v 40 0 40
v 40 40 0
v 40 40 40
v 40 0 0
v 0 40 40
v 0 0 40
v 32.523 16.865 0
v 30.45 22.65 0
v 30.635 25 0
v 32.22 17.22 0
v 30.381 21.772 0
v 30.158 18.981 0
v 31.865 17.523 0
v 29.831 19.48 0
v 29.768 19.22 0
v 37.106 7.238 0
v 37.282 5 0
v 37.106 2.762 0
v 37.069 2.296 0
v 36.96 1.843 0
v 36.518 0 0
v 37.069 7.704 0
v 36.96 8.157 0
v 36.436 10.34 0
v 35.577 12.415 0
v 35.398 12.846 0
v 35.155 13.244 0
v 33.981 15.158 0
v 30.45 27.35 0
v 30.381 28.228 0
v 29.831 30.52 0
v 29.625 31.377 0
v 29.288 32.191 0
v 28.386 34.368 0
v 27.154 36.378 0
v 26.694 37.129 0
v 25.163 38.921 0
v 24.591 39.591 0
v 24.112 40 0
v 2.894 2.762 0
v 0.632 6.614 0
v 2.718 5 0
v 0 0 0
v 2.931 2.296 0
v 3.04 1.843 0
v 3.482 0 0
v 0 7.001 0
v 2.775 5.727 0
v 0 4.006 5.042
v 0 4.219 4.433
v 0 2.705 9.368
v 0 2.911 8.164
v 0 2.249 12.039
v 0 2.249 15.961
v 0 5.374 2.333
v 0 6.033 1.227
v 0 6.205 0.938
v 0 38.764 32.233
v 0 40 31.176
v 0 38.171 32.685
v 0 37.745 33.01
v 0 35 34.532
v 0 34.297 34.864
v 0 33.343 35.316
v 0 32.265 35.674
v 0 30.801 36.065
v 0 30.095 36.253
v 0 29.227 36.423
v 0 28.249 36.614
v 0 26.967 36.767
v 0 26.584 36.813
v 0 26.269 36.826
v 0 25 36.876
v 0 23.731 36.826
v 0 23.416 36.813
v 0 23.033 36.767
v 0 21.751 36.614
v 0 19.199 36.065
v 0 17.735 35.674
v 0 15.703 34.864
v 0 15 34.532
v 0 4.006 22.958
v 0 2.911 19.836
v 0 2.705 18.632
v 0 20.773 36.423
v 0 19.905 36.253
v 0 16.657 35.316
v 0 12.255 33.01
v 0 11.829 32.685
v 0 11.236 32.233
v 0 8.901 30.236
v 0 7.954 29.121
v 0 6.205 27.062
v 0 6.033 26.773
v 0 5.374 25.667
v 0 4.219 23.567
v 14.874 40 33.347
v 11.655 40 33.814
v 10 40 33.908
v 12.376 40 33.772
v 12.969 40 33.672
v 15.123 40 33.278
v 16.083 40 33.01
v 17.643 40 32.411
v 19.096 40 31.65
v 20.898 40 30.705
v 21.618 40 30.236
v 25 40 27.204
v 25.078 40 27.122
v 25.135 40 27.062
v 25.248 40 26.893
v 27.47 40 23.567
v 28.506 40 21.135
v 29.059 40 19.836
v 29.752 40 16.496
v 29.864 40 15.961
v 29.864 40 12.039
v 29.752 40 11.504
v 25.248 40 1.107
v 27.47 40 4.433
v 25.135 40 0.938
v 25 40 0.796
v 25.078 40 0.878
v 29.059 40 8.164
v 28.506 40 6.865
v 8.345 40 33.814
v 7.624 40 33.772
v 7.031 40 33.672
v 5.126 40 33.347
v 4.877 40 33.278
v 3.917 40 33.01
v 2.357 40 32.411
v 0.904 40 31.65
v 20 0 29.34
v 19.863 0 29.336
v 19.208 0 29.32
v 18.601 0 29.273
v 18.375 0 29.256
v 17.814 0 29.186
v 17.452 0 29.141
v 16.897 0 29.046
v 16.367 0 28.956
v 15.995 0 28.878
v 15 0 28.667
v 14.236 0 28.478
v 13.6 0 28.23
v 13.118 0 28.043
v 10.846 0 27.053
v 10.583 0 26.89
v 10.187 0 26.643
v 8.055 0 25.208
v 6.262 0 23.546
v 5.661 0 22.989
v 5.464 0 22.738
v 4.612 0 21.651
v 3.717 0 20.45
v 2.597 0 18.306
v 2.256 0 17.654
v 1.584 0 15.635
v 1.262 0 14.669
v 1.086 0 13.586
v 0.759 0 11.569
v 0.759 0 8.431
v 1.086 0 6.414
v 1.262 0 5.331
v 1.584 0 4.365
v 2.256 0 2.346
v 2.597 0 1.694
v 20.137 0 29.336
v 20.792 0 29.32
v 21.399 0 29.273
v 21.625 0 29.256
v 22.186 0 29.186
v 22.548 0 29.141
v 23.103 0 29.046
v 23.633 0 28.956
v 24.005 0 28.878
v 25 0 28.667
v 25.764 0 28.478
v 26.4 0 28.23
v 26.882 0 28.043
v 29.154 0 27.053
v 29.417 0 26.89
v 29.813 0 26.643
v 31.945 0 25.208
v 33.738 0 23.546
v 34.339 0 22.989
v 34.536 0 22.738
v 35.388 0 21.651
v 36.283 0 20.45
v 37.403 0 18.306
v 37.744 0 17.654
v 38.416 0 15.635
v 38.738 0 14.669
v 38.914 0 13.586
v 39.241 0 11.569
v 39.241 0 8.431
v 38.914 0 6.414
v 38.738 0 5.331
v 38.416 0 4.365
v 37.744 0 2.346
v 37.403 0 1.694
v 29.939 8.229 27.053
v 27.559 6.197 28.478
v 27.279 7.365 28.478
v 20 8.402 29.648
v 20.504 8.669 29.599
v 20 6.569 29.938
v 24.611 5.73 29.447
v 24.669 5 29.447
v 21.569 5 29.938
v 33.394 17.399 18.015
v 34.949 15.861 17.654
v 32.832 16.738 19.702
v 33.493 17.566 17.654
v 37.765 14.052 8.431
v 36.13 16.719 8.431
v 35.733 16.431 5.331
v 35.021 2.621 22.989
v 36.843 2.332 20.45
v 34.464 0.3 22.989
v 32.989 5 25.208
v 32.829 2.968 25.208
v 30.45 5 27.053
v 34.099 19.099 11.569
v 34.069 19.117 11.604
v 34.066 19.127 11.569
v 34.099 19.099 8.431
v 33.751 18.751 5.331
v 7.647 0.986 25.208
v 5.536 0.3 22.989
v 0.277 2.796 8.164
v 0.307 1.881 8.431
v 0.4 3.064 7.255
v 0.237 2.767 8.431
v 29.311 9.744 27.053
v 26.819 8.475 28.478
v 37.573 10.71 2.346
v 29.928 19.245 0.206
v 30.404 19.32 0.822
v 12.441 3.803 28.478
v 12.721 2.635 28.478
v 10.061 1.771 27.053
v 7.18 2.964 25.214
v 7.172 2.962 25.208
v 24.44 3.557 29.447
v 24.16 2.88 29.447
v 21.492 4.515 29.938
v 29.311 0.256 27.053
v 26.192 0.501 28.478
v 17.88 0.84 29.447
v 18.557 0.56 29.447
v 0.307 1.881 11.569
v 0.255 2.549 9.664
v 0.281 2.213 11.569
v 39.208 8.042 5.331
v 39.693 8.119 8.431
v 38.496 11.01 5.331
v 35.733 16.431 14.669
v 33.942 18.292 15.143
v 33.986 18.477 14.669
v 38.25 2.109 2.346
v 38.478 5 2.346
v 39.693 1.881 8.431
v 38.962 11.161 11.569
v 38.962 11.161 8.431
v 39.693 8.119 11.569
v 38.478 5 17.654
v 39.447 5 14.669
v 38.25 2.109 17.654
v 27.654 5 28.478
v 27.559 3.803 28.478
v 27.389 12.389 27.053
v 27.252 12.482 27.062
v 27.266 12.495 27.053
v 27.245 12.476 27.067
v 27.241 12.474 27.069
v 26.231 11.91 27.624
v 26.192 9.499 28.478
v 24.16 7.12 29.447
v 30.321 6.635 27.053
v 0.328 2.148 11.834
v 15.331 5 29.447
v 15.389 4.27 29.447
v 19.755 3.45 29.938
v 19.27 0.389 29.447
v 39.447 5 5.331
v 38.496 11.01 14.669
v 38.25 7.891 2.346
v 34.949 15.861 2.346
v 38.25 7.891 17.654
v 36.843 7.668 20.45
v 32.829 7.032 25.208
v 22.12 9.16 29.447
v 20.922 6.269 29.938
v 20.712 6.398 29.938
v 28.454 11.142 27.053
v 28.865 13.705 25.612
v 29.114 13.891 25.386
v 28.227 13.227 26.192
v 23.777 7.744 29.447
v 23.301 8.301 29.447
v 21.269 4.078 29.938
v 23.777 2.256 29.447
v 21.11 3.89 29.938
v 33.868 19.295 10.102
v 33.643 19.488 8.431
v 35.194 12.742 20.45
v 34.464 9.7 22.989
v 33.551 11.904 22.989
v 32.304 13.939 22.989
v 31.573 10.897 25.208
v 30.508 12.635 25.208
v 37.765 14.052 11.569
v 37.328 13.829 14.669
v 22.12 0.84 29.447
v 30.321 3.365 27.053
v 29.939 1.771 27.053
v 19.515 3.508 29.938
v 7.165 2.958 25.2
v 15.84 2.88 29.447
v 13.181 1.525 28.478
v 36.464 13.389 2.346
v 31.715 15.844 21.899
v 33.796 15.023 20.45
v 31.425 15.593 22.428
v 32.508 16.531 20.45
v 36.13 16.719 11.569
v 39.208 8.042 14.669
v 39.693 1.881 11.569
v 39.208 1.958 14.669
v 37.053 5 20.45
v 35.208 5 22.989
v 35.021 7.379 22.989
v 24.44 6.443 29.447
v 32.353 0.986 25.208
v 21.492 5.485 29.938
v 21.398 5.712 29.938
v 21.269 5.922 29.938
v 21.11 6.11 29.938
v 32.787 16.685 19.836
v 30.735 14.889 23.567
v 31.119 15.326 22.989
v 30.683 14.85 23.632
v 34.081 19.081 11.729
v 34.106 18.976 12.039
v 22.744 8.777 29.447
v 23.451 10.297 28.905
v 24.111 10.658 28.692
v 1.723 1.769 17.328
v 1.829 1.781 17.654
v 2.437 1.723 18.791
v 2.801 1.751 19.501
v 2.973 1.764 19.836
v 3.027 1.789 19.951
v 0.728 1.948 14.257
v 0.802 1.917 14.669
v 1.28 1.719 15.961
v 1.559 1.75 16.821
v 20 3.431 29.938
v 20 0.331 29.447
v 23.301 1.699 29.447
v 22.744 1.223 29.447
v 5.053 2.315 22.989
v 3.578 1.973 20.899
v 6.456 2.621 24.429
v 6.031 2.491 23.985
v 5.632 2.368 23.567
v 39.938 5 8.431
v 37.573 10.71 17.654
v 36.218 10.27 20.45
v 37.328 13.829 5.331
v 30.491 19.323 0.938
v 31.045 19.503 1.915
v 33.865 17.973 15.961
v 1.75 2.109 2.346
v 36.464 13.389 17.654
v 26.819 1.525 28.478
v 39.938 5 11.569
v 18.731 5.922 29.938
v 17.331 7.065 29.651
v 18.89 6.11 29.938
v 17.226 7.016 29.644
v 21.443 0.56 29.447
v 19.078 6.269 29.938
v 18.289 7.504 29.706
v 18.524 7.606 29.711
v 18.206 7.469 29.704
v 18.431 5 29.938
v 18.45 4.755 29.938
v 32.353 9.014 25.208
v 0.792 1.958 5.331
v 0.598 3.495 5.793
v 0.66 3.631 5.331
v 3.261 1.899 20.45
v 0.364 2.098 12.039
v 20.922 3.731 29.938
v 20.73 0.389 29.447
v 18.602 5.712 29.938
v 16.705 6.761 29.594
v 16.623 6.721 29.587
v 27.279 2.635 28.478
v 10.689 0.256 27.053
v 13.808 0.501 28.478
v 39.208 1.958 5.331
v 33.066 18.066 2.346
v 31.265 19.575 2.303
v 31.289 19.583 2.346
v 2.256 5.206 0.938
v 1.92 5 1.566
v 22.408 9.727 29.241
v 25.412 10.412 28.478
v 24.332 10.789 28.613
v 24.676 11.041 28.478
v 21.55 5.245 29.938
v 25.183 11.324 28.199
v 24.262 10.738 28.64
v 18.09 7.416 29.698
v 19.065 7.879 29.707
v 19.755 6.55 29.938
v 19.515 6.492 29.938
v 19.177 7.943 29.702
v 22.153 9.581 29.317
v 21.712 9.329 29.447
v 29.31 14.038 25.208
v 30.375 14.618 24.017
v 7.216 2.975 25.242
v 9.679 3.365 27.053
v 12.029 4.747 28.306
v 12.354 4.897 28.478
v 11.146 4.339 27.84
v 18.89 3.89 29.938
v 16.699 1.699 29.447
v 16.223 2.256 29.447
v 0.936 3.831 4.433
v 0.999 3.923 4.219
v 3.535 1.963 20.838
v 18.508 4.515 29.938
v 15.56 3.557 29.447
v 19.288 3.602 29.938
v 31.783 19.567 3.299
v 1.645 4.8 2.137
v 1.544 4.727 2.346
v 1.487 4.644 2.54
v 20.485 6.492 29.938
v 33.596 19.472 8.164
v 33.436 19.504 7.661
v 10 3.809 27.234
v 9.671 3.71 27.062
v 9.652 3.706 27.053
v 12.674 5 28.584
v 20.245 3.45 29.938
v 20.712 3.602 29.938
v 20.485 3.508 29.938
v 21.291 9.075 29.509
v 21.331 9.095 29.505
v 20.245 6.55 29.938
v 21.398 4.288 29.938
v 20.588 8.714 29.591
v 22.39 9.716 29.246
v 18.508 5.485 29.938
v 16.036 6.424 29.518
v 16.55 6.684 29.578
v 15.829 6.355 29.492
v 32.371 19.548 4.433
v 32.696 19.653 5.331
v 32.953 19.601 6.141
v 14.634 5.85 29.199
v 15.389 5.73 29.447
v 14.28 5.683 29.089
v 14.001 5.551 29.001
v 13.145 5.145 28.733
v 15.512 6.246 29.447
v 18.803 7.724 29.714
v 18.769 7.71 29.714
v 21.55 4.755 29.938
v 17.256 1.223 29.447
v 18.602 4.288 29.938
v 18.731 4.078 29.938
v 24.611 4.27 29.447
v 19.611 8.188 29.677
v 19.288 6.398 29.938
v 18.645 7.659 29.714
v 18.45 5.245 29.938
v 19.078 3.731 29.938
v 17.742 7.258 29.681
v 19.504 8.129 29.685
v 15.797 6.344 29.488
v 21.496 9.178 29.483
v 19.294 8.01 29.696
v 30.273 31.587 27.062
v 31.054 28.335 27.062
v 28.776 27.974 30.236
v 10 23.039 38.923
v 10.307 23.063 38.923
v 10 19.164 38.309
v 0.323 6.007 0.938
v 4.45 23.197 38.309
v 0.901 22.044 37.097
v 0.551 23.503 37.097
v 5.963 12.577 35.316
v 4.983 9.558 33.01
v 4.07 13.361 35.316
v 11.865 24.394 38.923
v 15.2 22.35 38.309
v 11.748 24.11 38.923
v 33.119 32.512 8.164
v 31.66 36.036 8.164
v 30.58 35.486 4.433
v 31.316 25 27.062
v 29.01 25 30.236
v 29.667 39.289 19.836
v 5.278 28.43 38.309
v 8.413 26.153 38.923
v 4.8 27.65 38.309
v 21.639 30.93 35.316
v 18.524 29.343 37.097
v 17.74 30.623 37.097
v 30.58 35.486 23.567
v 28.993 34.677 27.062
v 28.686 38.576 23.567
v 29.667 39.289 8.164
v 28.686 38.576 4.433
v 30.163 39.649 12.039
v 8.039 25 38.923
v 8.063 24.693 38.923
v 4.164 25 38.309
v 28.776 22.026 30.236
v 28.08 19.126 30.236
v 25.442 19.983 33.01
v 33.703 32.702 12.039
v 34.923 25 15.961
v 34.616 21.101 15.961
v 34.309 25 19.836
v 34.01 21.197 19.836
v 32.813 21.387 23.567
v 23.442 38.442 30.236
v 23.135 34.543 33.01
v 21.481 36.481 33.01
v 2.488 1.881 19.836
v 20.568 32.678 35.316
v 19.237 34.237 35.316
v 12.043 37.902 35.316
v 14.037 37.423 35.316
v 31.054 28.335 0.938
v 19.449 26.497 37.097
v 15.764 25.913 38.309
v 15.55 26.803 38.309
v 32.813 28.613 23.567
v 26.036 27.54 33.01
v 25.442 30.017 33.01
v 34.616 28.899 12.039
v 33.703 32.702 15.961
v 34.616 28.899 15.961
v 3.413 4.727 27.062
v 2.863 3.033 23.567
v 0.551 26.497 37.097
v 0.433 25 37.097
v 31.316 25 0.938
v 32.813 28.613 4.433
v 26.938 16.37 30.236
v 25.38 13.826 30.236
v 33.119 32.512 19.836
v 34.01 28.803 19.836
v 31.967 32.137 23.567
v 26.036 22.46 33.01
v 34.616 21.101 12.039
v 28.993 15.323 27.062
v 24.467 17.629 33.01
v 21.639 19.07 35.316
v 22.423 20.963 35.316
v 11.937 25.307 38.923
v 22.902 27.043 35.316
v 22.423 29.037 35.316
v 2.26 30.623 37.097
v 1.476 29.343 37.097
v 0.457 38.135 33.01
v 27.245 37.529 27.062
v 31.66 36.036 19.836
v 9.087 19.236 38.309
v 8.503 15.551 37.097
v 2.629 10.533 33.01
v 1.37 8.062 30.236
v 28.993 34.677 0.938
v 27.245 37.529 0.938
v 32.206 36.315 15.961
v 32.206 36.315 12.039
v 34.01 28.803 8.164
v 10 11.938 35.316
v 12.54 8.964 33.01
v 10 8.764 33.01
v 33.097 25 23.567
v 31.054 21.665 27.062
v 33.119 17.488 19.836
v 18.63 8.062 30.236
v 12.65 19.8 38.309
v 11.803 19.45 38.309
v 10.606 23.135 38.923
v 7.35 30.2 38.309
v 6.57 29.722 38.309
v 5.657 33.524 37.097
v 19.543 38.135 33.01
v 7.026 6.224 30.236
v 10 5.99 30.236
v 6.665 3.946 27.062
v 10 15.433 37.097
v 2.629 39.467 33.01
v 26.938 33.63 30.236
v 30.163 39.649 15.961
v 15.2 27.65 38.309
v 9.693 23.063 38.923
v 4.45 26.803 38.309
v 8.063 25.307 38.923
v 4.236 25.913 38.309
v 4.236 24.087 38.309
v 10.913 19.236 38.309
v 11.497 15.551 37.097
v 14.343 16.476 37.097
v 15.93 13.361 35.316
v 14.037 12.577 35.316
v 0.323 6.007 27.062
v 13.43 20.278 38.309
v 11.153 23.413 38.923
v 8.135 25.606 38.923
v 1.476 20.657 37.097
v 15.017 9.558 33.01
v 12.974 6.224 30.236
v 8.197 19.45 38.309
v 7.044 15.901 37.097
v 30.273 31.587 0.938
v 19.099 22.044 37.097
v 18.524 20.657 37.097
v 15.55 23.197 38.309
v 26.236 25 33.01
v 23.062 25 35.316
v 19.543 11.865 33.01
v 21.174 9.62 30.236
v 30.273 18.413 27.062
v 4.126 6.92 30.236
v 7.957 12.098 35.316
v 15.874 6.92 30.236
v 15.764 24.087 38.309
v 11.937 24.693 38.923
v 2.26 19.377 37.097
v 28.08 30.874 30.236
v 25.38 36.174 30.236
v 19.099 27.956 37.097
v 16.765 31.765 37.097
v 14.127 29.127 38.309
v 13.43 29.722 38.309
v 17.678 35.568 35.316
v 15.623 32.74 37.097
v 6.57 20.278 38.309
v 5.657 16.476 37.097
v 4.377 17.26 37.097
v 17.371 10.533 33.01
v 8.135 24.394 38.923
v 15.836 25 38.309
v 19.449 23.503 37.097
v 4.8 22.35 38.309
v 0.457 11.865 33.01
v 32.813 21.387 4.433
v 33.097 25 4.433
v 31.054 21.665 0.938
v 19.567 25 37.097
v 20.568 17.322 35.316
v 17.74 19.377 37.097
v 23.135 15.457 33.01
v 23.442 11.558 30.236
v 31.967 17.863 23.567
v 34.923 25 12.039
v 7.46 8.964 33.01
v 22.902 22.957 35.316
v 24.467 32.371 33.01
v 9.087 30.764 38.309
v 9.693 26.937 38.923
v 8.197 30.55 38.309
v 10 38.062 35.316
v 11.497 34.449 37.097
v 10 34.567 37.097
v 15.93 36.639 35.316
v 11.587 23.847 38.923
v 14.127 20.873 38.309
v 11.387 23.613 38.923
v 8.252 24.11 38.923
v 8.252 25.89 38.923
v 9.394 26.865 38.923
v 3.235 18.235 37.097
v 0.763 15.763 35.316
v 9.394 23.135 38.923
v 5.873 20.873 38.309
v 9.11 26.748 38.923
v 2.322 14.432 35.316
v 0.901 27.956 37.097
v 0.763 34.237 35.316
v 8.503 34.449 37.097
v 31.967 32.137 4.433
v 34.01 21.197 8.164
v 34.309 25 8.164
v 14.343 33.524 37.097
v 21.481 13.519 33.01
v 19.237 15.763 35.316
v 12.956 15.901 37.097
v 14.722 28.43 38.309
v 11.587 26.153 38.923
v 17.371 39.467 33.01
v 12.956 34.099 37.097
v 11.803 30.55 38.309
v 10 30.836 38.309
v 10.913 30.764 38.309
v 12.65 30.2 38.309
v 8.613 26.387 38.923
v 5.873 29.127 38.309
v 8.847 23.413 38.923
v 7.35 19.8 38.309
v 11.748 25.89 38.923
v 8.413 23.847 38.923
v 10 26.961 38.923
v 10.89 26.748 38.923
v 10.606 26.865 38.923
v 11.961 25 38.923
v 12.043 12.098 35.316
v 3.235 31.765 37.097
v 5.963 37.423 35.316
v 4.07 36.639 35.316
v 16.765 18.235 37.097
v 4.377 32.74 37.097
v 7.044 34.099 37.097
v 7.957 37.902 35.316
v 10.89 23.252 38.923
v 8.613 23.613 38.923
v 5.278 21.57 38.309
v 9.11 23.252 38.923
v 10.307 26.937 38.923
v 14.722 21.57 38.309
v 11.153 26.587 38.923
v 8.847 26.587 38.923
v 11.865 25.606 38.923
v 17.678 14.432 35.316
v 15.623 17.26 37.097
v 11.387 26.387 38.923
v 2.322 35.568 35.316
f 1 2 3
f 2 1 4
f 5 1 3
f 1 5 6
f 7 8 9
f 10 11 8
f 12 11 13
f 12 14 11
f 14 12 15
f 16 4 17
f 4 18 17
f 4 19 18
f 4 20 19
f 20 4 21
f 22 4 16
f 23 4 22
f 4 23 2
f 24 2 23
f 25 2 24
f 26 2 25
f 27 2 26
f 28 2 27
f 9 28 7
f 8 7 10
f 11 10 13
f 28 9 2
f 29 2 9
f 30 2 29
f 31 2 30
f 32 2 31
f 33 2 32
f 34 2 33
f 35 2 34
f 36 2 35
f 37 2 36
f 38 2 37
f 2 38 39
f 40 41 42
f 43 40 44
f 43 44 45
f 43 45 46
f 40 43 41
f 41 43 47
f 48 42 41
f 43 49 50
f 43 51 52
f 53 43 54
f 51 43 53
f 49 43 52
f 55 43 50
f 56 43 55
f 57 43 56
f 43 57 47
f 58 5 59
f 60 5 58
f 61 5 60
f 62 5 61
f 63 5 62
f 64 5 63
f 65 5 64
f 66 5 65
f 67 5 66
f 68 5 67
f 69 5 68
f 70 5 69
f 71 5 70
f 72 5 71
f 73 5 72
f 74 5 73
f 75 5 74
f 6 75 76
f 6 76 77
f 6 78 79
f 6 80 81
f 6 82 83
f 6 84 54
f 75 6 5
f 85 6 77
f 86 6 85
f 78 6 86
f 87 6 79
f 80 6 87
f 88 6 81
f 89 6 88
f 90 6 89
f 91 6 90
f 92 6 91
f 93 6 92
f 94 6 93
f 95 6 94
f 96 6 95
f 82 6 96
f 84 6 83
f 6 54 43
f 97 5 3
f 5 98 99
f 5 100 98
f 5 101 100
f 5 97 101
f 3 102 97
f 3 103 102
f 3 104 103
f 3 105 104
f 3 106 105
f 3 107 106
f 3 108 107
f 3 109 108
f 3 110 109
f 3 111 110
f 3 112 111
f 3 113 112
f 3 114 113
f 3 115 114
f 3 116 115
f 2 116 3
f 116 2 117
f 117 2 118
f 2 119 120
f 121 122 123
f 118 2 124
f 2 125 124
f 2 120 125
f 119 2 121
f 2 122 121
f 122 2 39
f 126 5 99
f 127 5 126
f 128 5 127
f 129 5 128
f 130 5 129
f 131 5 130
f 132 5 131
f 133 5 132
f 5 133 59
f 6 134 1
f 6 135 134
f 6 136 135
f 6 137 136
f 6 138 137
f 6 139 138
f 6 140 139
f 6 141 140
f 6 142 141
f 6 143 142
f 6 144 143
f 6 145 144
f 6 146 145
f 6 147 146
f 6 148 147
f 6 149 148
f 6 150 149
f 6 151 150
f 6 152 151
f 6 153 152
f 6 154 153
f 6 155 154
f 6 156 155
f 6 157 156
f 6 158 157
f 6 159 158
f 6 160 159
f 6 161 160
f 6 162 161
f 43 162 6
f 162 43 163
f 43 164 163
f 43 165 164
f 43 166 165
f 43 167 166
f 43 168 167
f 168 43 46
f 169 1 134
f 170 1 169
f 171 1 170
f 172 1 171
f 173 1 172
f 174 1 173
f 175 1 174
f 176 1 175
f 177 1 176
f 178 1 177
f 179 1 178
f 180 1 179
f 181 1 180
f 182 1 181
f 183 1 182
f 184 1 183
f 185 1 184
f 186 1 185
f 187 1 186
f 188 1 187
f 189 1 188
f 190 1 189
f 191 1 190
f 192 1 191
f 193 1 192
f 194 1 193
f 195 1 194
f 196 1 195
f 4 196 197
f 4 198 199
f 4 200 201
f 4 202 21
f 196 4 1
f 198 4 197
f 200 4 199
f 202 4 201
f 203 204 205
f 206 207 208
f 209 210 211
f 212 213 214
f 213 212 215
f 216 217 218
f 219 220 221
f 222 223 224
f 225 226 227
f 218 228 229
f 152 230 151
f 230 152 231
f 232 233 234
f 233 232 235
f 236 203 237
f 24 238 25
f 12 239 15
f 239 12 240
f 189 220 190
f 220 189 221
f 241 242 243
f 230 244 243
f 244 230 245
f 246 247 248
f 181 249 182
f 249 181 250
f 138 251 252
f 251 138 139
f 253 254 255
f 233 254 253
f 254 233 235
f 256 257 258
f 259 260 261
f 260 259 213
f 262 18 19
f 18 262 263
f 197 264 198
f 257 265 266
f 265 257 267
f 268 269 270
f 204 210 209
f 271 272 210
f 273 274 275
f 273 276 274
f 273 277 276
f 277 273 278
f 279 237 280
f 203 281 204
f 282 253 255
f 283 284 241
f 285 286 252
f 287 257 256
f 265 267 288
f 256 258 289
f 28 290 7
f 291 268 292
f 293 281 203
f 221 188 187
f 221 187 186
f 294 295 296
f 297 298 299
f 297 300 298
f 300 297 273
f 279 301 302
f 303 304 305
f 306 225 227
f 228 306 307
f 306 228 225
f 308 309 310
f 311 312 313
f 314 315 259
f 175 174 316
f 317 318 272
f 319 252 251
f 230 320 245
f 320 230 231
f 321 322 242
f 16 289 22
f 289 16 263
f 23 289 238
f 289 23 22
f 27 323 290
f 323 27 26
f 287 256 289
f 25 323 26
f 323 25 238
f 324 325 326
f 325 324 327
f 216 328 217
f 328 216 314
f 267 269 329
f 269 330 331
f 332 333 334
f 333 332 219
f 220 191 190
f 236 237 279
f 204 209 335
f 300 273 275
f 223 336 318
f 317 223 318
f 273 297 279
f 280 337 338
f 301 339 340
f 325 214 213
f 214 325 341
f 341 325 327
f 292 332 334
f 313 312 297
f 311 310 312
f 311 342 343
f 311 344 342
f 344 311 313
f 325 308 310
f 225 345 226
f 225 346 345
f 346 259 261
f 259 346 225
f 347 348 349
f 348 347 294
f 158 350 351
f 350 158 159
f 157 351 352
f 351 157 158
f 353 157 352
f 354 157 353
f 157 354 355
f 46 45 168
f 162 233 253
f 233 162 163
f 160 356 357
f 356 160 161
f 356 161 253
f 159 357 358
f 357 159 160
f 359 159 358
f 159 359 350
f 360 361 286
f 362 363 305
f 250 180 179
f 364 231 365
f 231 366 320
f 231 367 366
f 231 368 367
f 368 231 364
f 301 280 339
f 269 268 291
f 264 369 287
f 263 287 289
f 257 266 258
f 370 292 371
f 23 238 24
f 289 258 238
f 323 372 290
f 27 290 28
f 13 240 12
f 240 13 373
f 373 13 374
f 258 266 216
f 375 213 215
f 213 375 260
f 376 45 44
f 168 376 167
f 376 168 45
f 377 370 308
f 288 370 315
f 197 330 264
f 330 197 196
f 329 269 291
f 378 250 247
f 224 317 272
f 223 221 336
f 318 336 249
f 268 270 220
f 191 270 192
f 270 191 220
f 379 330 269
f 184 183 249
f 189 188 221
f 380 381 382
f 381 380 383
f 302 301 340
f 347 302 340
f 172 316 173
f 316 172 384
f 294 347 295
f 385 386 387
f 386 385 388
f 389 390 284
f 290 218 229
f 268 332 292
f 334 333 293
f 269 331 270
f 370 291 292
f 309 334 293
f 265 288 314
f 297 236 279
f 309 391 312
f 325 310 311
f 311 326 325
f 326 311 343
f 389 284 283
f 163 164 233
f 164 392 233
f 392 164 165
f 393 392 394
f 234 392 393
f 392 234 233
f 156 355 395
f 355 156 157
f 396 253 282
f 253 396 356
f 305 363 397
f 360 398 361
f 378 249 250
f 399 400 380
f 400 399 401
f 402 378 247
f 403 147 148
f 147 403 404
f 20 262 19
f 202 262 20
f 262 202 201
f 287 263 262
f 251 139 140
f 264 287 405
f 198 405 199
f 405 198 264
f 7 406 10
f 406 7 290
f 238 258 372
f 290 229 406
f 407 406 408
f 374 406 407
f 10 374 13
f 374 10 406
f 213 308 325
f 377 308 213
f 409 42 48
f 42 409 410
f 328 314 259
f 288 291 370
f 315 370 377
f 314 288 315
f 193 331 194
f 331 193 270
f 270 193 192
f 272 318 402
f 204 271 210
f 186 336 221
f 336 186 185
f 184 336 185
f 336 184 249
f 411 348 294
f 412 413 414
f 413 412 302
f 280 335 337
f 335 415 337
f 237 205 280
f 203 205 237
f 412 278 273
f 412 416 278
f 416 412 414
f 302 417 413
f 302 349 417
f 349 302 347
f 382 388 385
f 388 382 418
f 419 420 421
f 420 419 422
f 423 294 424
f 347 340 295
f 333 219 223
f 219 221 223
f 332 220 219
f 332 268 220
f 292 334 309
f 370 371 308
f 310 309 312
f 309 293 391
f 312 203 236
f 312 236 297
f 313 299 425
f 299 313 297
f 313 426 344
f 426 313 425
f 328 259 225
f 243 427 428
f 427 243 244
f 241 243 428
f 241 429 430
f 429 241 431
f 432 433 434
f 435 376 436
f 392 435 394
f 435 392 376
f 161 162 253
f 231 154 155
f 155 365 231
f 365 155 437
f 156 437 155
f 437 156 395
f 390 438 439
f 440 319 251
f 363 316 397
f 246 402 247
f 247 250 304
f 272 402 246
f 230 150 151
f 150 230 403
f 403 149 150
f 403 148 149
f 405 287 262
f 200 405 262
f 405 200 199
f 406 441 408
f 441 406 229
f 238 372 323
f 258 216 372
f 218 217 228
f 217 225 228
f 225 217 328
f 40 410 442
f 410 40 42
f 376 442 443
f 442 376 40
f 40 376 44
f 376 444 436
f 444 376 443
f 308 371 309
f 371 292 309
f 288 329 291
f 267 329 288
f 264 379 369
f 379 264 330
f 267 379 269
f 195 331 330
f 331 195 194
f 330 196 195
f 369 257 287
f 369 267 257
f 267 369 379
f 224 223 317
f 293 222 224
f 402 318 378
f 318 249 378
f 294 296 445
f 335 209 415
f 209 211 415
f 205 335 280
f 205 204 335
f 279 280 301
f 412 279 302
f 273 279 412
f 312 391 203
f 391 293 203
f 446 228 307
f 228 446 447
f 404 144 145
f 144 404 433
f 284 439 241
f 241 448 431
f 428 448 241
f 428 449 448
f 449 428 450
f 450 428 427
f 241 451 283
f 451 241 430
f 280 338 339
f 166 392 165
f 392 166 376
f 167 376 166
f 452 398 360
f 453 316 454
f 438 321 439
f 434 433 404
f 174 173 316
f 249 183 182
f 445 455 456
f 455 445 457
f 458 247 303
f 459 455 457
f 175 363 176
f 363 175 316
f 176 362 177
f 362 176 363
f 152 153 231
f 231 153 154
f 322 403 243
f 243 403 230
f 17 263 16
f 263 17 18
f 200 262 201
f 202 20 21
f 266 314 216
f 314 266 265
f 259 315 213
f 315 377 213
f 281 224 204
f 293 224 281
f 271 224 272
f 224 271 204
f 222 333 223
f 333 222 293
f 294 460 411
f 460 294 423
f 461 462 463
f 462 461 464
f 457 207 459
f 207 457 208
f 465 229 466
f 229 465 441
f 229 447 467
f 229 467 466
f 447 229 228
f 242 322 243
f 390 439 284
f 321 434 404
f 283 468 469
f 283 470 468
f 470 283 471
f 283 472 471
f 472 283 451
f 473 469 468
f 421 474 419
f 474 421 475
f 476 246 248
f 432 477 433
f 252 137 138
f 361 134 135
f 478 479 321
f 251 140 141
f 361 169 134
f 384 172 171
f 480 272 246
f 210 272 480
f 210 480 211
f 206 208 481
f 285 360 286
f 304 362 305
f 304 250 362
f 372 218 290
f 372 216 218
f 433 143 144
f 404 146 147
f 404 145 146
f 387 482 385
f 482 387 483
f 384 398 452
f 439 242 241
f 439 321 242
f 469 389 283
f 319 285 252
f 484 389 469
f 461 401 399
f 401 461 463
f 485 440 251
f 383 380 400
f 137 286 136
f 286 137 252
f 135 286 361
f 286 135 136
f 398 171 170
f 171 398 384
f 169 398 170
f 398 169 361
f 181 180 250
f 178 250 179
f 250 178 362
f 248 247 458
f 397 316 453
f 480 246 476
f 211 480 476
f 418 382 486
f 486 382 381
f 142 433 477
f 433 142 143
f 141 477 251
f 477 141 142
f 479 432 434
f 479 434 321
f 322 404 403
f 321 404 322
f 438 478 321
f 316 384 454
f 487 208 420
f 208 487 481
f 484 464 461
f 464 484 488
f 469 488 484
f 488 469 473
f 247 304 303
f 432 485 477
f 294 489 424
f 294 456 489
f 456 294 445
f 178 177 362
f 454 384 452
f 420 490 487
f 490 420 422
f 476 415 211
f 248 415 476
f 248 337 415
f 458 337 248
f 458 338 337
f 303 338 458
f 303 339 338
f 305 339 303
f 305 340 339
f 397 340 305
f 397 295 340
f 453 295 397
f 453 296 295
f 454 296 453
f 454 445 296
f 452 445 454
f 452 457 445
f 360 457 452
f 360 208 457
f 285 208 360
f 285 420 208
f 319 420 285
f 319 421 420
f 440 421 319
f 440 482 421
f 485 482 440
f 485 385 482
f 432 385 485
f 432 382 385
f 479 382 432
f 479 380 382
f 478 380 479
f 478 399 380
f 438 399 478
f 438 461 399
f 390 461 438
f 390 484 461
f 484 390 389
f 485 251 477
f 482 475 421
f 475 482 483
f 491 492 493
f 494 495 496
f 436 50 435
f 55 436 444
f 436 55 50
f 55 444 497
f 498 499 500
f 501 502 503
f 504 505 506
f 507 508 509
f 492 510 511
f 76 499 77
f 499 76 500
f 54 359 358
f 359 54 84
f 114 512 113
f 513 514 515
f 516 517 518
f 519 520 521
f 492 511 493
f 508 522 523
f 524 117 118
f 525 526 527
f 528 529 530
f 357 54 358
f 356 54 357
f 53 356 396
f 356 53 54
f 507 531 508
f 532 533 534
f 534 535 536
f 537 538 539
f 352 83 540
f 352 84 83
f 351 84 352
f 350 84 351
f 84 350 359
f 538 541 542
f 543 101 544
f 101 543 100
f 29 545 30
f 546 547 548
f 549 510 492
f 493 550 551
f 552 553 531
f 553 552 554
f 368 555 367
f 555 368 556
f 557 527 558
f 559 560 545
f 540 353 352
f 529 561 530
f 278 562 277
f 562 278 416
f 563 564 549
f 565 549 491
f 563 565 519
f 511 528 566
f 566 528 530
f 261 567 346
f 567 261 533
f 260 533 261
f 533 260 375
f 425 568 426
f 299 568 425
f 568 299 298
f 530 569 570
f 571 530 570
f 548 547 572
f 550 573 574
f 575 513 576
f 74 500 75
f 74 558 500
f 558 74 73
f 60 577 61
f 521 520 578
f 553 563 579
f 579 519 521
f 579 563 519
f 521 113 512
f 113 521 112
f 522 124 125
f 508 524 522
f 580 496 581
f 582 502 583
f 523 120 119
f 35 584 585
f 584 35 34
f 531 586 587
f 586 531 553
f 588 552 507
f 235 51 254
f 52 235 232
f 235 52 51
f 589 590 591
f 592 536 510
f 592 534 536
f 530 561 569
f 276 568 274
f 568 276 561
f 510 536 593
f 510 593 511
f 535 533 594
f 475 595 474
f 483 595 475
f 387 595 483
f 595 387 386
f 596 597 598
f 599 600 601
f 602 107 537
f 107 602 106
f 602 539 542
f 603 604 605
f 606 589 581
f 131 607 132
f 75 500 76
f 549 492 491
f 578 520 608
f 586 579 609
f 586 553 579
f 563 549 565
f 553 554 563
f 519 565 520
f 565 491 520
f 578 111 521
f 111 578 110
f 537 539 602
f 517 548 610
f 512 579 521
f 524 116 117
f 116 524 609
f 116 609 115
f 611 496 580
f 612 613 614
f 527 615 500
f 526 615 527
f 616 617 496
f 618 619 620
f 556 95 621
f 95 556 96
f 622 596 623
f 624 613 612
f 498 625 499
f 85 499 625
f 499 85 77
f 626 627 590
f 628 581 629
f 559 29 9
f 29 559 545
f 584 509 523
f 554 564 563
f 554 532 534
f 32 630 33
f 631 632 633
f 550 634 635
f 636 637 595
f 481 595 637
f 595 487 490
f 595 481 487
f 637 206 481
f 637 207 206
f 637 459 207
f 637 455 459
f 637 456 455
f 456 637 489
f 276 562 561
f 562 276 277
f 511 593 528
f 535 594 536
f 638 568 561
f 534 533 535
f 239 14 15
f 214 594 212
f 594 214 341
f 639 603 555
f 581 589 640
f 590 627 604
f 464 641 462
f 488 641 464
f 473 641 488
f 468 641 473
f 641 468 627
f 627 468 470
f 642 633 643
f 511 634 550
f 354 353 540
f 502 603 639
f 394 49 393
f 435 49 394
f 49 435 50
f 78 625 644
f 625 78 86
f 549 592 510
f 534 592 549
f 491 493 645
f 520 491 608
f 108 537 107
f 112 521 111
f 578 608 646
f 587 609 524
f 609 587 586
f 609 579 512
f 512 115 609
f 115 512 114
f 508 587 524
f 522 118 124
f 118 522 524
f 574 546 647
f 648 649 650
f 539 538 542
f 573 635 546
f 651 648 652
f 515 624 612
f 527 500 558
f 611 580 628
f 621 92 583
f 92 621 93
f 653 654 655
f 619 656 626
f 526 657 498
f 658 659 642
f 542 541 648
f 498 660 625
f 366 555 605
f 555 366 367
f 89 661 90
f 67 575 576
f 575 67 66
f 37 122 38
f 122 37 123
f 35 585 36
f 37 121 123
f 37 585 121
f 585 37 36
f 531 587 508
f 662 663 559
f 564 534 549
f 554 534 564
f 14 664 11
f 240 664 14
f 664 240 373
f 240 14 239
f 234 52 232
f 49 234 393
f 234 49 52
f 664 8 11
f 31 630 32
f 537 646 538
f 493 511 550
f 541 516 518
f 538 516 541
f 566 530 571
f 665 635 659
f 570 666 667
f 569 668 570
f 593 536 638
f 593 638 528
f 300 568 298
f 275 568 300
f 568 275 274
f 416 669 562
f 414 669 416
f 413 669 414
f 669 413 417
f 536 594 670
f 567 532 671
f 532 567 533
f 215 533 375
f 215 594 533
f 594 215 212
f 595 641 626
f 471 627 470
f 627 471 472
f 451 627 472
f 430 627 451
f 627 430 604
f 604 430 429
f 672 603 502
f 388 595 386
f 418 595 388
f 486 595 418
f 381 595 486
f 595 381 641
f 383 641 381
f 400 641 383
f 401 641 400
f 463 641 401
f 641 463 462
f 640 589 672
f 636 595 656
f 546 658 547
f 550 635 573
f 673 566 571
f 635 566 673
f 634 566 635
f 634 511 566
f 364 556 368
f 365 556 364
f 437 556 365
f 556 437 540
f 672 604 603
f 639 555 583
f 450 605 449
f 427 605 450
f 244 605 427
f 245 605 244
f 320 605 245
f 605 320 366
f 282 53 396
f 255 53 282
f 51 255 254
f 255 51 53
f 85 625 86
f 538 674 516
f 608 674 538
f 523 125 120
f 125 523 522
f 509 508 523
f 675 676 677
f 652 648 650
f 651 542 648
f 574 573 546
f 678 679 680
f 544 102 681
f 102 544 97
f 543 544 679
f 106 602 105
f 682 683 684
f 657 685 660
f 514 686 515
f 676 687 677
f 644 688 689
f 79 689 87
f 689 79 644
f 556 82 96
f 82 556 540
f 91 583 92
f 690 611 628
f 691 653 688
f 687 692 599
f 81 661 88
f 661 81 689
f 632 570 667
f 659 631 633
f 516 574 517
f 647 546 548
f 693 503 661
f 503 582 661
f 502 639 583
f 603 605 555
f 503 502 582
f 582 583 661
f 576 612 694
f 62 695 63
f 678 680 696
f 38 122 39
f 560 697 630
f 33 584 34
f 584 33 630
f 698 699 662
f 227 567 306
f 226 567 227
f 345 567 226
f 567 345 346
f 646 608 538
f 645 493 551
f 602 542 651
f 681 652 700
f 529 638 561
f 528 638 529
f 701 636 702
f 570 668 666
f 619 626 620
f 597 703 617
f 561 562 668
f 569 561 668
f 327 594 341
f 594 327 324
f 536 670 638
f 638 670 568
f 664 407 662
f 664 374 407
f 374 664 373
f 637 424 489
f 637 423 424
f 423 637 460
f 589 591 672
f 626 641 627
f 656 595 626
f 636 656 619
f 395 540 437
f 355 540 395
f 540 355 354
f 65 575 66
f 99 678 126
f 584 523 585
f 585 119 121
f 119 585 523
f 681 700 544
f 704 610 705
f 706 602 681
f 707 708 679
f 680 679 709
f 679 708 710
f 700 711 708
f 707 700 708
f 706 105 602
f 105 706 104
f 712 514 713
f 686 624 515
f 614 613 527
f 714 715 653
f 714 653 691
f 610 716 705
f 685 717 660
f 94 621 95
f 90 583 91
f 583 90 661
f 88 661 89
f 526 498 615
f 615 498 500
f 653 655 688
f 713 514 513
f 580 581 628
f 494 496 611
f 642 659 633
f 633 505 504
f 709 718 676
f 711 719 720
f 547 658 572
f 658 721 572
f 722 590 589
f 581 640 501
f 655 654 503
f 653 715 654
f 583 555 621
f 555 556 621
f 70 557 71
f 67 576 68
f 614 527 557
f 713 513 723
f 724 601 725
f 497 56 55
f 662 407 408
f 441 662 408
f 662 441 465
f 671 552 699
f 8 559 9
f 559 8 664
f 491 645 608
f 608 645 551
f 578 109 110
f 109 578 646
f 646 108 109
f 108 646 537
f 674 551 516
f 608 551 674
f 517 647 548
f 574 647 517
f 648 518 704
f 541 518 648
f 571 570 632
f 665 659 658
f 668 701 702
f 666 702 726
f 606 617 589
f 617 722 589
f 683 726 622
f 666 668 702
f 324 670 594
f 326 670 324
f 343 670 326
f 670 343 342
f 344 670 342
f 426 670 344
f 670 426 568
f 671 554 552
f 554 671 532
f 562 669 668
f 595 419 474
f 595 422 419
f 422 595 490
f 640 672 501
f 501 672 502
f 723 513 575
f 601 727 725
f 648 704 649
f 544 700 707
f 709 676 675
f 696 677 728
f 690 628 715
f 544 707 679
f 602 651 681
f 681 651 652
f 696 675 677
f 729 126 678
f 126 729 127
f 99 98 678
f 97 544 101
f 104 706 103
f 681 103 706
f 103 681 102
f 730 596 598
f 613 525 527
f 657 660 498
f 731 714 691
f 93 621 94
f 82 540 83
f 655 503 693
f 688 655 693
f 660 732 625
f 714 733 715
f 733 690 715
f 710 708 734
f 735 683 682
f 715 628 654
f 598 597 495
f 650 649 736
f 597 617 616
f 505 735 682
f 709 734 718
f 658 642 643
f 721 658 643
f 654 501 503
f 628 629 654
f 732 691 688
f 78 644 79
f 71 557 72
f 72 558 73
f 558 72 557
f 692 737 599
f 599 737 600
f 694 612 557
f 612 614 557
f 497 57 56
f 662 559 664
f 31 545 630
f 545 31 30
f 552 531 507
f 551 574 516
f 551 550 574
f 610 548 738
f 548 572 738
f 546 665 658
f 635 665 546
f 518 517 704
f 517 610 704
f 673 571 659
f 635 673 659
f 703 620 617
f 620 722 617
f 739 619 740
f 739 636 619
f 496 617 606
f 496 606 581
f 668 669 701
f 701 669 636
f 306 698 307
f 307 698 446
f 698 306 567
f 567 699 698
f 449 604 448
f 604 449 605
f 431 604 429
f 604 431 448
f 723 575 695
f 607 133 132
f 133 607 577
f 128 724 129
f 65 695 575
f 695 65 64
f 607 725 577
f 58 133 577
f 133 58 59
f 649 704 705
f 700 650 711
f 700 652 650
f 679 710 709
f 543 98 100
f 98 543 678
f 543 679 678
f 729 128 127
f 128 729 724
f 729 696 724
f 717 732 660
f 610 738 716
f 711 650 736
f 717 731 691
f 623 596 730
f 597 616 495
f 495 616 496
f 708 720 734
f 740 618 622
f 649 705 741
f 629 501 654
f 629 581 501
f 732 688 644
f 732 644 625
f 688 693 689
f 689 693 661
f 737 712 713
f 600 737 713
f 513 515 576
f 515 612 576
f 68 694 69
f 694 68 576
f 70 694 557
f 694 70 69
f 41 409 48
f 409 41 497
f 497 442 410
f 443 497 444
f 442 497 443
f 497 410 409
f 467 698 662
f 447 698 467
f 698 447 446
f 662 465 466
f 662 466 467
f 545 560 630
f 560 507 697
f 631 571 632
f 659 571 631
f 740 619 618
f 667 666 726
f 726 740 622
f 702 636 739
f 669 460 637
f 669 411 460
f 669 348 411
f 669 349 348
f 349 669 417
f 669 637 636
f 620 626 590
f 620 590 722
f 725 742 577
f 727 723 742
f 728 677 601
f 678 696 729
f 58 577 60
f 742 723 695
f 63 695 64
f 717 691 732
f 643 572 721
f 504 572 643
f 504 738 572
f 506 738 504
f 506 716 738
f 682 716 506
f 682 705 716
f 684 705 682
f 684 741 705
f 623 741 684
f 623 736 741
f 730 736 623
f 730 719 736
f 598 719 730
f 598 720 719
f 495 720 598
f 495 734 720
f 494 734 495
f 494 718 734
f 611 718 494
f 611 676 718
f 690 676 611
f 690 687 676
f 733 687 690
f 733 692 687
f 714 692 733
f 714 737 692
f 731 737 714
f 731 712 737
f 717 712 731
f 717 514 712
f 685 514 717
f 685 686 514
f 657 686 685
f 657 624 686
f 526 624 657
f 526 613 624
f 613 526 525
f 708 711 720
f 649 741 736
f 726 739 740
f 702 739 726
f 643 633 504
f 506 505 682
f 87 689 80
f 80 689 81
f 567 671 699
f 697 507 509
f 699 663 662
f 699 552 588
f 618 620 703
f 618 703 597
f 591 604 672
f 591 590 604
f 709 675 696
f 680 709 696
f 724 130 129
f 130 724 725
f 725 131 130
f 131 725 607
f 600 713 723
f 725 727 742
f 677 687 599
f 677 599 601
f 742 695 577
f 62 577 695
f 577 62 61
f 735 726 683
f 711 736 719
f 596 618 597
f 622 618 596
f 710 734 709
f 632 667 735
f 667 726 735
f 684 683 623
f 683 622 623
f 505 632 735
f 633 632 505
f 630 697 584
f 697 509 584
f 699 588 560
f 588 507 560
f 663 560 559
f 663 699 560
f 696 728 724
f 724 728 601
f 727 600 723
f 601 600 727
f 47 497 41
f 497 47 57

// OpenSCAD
$fn=40;
difference() {
	cube(40);
	translate([20, 5, 10])
		sphere(r=20);
	translate([10, 25, 14])
		sphere(r=25);
}
